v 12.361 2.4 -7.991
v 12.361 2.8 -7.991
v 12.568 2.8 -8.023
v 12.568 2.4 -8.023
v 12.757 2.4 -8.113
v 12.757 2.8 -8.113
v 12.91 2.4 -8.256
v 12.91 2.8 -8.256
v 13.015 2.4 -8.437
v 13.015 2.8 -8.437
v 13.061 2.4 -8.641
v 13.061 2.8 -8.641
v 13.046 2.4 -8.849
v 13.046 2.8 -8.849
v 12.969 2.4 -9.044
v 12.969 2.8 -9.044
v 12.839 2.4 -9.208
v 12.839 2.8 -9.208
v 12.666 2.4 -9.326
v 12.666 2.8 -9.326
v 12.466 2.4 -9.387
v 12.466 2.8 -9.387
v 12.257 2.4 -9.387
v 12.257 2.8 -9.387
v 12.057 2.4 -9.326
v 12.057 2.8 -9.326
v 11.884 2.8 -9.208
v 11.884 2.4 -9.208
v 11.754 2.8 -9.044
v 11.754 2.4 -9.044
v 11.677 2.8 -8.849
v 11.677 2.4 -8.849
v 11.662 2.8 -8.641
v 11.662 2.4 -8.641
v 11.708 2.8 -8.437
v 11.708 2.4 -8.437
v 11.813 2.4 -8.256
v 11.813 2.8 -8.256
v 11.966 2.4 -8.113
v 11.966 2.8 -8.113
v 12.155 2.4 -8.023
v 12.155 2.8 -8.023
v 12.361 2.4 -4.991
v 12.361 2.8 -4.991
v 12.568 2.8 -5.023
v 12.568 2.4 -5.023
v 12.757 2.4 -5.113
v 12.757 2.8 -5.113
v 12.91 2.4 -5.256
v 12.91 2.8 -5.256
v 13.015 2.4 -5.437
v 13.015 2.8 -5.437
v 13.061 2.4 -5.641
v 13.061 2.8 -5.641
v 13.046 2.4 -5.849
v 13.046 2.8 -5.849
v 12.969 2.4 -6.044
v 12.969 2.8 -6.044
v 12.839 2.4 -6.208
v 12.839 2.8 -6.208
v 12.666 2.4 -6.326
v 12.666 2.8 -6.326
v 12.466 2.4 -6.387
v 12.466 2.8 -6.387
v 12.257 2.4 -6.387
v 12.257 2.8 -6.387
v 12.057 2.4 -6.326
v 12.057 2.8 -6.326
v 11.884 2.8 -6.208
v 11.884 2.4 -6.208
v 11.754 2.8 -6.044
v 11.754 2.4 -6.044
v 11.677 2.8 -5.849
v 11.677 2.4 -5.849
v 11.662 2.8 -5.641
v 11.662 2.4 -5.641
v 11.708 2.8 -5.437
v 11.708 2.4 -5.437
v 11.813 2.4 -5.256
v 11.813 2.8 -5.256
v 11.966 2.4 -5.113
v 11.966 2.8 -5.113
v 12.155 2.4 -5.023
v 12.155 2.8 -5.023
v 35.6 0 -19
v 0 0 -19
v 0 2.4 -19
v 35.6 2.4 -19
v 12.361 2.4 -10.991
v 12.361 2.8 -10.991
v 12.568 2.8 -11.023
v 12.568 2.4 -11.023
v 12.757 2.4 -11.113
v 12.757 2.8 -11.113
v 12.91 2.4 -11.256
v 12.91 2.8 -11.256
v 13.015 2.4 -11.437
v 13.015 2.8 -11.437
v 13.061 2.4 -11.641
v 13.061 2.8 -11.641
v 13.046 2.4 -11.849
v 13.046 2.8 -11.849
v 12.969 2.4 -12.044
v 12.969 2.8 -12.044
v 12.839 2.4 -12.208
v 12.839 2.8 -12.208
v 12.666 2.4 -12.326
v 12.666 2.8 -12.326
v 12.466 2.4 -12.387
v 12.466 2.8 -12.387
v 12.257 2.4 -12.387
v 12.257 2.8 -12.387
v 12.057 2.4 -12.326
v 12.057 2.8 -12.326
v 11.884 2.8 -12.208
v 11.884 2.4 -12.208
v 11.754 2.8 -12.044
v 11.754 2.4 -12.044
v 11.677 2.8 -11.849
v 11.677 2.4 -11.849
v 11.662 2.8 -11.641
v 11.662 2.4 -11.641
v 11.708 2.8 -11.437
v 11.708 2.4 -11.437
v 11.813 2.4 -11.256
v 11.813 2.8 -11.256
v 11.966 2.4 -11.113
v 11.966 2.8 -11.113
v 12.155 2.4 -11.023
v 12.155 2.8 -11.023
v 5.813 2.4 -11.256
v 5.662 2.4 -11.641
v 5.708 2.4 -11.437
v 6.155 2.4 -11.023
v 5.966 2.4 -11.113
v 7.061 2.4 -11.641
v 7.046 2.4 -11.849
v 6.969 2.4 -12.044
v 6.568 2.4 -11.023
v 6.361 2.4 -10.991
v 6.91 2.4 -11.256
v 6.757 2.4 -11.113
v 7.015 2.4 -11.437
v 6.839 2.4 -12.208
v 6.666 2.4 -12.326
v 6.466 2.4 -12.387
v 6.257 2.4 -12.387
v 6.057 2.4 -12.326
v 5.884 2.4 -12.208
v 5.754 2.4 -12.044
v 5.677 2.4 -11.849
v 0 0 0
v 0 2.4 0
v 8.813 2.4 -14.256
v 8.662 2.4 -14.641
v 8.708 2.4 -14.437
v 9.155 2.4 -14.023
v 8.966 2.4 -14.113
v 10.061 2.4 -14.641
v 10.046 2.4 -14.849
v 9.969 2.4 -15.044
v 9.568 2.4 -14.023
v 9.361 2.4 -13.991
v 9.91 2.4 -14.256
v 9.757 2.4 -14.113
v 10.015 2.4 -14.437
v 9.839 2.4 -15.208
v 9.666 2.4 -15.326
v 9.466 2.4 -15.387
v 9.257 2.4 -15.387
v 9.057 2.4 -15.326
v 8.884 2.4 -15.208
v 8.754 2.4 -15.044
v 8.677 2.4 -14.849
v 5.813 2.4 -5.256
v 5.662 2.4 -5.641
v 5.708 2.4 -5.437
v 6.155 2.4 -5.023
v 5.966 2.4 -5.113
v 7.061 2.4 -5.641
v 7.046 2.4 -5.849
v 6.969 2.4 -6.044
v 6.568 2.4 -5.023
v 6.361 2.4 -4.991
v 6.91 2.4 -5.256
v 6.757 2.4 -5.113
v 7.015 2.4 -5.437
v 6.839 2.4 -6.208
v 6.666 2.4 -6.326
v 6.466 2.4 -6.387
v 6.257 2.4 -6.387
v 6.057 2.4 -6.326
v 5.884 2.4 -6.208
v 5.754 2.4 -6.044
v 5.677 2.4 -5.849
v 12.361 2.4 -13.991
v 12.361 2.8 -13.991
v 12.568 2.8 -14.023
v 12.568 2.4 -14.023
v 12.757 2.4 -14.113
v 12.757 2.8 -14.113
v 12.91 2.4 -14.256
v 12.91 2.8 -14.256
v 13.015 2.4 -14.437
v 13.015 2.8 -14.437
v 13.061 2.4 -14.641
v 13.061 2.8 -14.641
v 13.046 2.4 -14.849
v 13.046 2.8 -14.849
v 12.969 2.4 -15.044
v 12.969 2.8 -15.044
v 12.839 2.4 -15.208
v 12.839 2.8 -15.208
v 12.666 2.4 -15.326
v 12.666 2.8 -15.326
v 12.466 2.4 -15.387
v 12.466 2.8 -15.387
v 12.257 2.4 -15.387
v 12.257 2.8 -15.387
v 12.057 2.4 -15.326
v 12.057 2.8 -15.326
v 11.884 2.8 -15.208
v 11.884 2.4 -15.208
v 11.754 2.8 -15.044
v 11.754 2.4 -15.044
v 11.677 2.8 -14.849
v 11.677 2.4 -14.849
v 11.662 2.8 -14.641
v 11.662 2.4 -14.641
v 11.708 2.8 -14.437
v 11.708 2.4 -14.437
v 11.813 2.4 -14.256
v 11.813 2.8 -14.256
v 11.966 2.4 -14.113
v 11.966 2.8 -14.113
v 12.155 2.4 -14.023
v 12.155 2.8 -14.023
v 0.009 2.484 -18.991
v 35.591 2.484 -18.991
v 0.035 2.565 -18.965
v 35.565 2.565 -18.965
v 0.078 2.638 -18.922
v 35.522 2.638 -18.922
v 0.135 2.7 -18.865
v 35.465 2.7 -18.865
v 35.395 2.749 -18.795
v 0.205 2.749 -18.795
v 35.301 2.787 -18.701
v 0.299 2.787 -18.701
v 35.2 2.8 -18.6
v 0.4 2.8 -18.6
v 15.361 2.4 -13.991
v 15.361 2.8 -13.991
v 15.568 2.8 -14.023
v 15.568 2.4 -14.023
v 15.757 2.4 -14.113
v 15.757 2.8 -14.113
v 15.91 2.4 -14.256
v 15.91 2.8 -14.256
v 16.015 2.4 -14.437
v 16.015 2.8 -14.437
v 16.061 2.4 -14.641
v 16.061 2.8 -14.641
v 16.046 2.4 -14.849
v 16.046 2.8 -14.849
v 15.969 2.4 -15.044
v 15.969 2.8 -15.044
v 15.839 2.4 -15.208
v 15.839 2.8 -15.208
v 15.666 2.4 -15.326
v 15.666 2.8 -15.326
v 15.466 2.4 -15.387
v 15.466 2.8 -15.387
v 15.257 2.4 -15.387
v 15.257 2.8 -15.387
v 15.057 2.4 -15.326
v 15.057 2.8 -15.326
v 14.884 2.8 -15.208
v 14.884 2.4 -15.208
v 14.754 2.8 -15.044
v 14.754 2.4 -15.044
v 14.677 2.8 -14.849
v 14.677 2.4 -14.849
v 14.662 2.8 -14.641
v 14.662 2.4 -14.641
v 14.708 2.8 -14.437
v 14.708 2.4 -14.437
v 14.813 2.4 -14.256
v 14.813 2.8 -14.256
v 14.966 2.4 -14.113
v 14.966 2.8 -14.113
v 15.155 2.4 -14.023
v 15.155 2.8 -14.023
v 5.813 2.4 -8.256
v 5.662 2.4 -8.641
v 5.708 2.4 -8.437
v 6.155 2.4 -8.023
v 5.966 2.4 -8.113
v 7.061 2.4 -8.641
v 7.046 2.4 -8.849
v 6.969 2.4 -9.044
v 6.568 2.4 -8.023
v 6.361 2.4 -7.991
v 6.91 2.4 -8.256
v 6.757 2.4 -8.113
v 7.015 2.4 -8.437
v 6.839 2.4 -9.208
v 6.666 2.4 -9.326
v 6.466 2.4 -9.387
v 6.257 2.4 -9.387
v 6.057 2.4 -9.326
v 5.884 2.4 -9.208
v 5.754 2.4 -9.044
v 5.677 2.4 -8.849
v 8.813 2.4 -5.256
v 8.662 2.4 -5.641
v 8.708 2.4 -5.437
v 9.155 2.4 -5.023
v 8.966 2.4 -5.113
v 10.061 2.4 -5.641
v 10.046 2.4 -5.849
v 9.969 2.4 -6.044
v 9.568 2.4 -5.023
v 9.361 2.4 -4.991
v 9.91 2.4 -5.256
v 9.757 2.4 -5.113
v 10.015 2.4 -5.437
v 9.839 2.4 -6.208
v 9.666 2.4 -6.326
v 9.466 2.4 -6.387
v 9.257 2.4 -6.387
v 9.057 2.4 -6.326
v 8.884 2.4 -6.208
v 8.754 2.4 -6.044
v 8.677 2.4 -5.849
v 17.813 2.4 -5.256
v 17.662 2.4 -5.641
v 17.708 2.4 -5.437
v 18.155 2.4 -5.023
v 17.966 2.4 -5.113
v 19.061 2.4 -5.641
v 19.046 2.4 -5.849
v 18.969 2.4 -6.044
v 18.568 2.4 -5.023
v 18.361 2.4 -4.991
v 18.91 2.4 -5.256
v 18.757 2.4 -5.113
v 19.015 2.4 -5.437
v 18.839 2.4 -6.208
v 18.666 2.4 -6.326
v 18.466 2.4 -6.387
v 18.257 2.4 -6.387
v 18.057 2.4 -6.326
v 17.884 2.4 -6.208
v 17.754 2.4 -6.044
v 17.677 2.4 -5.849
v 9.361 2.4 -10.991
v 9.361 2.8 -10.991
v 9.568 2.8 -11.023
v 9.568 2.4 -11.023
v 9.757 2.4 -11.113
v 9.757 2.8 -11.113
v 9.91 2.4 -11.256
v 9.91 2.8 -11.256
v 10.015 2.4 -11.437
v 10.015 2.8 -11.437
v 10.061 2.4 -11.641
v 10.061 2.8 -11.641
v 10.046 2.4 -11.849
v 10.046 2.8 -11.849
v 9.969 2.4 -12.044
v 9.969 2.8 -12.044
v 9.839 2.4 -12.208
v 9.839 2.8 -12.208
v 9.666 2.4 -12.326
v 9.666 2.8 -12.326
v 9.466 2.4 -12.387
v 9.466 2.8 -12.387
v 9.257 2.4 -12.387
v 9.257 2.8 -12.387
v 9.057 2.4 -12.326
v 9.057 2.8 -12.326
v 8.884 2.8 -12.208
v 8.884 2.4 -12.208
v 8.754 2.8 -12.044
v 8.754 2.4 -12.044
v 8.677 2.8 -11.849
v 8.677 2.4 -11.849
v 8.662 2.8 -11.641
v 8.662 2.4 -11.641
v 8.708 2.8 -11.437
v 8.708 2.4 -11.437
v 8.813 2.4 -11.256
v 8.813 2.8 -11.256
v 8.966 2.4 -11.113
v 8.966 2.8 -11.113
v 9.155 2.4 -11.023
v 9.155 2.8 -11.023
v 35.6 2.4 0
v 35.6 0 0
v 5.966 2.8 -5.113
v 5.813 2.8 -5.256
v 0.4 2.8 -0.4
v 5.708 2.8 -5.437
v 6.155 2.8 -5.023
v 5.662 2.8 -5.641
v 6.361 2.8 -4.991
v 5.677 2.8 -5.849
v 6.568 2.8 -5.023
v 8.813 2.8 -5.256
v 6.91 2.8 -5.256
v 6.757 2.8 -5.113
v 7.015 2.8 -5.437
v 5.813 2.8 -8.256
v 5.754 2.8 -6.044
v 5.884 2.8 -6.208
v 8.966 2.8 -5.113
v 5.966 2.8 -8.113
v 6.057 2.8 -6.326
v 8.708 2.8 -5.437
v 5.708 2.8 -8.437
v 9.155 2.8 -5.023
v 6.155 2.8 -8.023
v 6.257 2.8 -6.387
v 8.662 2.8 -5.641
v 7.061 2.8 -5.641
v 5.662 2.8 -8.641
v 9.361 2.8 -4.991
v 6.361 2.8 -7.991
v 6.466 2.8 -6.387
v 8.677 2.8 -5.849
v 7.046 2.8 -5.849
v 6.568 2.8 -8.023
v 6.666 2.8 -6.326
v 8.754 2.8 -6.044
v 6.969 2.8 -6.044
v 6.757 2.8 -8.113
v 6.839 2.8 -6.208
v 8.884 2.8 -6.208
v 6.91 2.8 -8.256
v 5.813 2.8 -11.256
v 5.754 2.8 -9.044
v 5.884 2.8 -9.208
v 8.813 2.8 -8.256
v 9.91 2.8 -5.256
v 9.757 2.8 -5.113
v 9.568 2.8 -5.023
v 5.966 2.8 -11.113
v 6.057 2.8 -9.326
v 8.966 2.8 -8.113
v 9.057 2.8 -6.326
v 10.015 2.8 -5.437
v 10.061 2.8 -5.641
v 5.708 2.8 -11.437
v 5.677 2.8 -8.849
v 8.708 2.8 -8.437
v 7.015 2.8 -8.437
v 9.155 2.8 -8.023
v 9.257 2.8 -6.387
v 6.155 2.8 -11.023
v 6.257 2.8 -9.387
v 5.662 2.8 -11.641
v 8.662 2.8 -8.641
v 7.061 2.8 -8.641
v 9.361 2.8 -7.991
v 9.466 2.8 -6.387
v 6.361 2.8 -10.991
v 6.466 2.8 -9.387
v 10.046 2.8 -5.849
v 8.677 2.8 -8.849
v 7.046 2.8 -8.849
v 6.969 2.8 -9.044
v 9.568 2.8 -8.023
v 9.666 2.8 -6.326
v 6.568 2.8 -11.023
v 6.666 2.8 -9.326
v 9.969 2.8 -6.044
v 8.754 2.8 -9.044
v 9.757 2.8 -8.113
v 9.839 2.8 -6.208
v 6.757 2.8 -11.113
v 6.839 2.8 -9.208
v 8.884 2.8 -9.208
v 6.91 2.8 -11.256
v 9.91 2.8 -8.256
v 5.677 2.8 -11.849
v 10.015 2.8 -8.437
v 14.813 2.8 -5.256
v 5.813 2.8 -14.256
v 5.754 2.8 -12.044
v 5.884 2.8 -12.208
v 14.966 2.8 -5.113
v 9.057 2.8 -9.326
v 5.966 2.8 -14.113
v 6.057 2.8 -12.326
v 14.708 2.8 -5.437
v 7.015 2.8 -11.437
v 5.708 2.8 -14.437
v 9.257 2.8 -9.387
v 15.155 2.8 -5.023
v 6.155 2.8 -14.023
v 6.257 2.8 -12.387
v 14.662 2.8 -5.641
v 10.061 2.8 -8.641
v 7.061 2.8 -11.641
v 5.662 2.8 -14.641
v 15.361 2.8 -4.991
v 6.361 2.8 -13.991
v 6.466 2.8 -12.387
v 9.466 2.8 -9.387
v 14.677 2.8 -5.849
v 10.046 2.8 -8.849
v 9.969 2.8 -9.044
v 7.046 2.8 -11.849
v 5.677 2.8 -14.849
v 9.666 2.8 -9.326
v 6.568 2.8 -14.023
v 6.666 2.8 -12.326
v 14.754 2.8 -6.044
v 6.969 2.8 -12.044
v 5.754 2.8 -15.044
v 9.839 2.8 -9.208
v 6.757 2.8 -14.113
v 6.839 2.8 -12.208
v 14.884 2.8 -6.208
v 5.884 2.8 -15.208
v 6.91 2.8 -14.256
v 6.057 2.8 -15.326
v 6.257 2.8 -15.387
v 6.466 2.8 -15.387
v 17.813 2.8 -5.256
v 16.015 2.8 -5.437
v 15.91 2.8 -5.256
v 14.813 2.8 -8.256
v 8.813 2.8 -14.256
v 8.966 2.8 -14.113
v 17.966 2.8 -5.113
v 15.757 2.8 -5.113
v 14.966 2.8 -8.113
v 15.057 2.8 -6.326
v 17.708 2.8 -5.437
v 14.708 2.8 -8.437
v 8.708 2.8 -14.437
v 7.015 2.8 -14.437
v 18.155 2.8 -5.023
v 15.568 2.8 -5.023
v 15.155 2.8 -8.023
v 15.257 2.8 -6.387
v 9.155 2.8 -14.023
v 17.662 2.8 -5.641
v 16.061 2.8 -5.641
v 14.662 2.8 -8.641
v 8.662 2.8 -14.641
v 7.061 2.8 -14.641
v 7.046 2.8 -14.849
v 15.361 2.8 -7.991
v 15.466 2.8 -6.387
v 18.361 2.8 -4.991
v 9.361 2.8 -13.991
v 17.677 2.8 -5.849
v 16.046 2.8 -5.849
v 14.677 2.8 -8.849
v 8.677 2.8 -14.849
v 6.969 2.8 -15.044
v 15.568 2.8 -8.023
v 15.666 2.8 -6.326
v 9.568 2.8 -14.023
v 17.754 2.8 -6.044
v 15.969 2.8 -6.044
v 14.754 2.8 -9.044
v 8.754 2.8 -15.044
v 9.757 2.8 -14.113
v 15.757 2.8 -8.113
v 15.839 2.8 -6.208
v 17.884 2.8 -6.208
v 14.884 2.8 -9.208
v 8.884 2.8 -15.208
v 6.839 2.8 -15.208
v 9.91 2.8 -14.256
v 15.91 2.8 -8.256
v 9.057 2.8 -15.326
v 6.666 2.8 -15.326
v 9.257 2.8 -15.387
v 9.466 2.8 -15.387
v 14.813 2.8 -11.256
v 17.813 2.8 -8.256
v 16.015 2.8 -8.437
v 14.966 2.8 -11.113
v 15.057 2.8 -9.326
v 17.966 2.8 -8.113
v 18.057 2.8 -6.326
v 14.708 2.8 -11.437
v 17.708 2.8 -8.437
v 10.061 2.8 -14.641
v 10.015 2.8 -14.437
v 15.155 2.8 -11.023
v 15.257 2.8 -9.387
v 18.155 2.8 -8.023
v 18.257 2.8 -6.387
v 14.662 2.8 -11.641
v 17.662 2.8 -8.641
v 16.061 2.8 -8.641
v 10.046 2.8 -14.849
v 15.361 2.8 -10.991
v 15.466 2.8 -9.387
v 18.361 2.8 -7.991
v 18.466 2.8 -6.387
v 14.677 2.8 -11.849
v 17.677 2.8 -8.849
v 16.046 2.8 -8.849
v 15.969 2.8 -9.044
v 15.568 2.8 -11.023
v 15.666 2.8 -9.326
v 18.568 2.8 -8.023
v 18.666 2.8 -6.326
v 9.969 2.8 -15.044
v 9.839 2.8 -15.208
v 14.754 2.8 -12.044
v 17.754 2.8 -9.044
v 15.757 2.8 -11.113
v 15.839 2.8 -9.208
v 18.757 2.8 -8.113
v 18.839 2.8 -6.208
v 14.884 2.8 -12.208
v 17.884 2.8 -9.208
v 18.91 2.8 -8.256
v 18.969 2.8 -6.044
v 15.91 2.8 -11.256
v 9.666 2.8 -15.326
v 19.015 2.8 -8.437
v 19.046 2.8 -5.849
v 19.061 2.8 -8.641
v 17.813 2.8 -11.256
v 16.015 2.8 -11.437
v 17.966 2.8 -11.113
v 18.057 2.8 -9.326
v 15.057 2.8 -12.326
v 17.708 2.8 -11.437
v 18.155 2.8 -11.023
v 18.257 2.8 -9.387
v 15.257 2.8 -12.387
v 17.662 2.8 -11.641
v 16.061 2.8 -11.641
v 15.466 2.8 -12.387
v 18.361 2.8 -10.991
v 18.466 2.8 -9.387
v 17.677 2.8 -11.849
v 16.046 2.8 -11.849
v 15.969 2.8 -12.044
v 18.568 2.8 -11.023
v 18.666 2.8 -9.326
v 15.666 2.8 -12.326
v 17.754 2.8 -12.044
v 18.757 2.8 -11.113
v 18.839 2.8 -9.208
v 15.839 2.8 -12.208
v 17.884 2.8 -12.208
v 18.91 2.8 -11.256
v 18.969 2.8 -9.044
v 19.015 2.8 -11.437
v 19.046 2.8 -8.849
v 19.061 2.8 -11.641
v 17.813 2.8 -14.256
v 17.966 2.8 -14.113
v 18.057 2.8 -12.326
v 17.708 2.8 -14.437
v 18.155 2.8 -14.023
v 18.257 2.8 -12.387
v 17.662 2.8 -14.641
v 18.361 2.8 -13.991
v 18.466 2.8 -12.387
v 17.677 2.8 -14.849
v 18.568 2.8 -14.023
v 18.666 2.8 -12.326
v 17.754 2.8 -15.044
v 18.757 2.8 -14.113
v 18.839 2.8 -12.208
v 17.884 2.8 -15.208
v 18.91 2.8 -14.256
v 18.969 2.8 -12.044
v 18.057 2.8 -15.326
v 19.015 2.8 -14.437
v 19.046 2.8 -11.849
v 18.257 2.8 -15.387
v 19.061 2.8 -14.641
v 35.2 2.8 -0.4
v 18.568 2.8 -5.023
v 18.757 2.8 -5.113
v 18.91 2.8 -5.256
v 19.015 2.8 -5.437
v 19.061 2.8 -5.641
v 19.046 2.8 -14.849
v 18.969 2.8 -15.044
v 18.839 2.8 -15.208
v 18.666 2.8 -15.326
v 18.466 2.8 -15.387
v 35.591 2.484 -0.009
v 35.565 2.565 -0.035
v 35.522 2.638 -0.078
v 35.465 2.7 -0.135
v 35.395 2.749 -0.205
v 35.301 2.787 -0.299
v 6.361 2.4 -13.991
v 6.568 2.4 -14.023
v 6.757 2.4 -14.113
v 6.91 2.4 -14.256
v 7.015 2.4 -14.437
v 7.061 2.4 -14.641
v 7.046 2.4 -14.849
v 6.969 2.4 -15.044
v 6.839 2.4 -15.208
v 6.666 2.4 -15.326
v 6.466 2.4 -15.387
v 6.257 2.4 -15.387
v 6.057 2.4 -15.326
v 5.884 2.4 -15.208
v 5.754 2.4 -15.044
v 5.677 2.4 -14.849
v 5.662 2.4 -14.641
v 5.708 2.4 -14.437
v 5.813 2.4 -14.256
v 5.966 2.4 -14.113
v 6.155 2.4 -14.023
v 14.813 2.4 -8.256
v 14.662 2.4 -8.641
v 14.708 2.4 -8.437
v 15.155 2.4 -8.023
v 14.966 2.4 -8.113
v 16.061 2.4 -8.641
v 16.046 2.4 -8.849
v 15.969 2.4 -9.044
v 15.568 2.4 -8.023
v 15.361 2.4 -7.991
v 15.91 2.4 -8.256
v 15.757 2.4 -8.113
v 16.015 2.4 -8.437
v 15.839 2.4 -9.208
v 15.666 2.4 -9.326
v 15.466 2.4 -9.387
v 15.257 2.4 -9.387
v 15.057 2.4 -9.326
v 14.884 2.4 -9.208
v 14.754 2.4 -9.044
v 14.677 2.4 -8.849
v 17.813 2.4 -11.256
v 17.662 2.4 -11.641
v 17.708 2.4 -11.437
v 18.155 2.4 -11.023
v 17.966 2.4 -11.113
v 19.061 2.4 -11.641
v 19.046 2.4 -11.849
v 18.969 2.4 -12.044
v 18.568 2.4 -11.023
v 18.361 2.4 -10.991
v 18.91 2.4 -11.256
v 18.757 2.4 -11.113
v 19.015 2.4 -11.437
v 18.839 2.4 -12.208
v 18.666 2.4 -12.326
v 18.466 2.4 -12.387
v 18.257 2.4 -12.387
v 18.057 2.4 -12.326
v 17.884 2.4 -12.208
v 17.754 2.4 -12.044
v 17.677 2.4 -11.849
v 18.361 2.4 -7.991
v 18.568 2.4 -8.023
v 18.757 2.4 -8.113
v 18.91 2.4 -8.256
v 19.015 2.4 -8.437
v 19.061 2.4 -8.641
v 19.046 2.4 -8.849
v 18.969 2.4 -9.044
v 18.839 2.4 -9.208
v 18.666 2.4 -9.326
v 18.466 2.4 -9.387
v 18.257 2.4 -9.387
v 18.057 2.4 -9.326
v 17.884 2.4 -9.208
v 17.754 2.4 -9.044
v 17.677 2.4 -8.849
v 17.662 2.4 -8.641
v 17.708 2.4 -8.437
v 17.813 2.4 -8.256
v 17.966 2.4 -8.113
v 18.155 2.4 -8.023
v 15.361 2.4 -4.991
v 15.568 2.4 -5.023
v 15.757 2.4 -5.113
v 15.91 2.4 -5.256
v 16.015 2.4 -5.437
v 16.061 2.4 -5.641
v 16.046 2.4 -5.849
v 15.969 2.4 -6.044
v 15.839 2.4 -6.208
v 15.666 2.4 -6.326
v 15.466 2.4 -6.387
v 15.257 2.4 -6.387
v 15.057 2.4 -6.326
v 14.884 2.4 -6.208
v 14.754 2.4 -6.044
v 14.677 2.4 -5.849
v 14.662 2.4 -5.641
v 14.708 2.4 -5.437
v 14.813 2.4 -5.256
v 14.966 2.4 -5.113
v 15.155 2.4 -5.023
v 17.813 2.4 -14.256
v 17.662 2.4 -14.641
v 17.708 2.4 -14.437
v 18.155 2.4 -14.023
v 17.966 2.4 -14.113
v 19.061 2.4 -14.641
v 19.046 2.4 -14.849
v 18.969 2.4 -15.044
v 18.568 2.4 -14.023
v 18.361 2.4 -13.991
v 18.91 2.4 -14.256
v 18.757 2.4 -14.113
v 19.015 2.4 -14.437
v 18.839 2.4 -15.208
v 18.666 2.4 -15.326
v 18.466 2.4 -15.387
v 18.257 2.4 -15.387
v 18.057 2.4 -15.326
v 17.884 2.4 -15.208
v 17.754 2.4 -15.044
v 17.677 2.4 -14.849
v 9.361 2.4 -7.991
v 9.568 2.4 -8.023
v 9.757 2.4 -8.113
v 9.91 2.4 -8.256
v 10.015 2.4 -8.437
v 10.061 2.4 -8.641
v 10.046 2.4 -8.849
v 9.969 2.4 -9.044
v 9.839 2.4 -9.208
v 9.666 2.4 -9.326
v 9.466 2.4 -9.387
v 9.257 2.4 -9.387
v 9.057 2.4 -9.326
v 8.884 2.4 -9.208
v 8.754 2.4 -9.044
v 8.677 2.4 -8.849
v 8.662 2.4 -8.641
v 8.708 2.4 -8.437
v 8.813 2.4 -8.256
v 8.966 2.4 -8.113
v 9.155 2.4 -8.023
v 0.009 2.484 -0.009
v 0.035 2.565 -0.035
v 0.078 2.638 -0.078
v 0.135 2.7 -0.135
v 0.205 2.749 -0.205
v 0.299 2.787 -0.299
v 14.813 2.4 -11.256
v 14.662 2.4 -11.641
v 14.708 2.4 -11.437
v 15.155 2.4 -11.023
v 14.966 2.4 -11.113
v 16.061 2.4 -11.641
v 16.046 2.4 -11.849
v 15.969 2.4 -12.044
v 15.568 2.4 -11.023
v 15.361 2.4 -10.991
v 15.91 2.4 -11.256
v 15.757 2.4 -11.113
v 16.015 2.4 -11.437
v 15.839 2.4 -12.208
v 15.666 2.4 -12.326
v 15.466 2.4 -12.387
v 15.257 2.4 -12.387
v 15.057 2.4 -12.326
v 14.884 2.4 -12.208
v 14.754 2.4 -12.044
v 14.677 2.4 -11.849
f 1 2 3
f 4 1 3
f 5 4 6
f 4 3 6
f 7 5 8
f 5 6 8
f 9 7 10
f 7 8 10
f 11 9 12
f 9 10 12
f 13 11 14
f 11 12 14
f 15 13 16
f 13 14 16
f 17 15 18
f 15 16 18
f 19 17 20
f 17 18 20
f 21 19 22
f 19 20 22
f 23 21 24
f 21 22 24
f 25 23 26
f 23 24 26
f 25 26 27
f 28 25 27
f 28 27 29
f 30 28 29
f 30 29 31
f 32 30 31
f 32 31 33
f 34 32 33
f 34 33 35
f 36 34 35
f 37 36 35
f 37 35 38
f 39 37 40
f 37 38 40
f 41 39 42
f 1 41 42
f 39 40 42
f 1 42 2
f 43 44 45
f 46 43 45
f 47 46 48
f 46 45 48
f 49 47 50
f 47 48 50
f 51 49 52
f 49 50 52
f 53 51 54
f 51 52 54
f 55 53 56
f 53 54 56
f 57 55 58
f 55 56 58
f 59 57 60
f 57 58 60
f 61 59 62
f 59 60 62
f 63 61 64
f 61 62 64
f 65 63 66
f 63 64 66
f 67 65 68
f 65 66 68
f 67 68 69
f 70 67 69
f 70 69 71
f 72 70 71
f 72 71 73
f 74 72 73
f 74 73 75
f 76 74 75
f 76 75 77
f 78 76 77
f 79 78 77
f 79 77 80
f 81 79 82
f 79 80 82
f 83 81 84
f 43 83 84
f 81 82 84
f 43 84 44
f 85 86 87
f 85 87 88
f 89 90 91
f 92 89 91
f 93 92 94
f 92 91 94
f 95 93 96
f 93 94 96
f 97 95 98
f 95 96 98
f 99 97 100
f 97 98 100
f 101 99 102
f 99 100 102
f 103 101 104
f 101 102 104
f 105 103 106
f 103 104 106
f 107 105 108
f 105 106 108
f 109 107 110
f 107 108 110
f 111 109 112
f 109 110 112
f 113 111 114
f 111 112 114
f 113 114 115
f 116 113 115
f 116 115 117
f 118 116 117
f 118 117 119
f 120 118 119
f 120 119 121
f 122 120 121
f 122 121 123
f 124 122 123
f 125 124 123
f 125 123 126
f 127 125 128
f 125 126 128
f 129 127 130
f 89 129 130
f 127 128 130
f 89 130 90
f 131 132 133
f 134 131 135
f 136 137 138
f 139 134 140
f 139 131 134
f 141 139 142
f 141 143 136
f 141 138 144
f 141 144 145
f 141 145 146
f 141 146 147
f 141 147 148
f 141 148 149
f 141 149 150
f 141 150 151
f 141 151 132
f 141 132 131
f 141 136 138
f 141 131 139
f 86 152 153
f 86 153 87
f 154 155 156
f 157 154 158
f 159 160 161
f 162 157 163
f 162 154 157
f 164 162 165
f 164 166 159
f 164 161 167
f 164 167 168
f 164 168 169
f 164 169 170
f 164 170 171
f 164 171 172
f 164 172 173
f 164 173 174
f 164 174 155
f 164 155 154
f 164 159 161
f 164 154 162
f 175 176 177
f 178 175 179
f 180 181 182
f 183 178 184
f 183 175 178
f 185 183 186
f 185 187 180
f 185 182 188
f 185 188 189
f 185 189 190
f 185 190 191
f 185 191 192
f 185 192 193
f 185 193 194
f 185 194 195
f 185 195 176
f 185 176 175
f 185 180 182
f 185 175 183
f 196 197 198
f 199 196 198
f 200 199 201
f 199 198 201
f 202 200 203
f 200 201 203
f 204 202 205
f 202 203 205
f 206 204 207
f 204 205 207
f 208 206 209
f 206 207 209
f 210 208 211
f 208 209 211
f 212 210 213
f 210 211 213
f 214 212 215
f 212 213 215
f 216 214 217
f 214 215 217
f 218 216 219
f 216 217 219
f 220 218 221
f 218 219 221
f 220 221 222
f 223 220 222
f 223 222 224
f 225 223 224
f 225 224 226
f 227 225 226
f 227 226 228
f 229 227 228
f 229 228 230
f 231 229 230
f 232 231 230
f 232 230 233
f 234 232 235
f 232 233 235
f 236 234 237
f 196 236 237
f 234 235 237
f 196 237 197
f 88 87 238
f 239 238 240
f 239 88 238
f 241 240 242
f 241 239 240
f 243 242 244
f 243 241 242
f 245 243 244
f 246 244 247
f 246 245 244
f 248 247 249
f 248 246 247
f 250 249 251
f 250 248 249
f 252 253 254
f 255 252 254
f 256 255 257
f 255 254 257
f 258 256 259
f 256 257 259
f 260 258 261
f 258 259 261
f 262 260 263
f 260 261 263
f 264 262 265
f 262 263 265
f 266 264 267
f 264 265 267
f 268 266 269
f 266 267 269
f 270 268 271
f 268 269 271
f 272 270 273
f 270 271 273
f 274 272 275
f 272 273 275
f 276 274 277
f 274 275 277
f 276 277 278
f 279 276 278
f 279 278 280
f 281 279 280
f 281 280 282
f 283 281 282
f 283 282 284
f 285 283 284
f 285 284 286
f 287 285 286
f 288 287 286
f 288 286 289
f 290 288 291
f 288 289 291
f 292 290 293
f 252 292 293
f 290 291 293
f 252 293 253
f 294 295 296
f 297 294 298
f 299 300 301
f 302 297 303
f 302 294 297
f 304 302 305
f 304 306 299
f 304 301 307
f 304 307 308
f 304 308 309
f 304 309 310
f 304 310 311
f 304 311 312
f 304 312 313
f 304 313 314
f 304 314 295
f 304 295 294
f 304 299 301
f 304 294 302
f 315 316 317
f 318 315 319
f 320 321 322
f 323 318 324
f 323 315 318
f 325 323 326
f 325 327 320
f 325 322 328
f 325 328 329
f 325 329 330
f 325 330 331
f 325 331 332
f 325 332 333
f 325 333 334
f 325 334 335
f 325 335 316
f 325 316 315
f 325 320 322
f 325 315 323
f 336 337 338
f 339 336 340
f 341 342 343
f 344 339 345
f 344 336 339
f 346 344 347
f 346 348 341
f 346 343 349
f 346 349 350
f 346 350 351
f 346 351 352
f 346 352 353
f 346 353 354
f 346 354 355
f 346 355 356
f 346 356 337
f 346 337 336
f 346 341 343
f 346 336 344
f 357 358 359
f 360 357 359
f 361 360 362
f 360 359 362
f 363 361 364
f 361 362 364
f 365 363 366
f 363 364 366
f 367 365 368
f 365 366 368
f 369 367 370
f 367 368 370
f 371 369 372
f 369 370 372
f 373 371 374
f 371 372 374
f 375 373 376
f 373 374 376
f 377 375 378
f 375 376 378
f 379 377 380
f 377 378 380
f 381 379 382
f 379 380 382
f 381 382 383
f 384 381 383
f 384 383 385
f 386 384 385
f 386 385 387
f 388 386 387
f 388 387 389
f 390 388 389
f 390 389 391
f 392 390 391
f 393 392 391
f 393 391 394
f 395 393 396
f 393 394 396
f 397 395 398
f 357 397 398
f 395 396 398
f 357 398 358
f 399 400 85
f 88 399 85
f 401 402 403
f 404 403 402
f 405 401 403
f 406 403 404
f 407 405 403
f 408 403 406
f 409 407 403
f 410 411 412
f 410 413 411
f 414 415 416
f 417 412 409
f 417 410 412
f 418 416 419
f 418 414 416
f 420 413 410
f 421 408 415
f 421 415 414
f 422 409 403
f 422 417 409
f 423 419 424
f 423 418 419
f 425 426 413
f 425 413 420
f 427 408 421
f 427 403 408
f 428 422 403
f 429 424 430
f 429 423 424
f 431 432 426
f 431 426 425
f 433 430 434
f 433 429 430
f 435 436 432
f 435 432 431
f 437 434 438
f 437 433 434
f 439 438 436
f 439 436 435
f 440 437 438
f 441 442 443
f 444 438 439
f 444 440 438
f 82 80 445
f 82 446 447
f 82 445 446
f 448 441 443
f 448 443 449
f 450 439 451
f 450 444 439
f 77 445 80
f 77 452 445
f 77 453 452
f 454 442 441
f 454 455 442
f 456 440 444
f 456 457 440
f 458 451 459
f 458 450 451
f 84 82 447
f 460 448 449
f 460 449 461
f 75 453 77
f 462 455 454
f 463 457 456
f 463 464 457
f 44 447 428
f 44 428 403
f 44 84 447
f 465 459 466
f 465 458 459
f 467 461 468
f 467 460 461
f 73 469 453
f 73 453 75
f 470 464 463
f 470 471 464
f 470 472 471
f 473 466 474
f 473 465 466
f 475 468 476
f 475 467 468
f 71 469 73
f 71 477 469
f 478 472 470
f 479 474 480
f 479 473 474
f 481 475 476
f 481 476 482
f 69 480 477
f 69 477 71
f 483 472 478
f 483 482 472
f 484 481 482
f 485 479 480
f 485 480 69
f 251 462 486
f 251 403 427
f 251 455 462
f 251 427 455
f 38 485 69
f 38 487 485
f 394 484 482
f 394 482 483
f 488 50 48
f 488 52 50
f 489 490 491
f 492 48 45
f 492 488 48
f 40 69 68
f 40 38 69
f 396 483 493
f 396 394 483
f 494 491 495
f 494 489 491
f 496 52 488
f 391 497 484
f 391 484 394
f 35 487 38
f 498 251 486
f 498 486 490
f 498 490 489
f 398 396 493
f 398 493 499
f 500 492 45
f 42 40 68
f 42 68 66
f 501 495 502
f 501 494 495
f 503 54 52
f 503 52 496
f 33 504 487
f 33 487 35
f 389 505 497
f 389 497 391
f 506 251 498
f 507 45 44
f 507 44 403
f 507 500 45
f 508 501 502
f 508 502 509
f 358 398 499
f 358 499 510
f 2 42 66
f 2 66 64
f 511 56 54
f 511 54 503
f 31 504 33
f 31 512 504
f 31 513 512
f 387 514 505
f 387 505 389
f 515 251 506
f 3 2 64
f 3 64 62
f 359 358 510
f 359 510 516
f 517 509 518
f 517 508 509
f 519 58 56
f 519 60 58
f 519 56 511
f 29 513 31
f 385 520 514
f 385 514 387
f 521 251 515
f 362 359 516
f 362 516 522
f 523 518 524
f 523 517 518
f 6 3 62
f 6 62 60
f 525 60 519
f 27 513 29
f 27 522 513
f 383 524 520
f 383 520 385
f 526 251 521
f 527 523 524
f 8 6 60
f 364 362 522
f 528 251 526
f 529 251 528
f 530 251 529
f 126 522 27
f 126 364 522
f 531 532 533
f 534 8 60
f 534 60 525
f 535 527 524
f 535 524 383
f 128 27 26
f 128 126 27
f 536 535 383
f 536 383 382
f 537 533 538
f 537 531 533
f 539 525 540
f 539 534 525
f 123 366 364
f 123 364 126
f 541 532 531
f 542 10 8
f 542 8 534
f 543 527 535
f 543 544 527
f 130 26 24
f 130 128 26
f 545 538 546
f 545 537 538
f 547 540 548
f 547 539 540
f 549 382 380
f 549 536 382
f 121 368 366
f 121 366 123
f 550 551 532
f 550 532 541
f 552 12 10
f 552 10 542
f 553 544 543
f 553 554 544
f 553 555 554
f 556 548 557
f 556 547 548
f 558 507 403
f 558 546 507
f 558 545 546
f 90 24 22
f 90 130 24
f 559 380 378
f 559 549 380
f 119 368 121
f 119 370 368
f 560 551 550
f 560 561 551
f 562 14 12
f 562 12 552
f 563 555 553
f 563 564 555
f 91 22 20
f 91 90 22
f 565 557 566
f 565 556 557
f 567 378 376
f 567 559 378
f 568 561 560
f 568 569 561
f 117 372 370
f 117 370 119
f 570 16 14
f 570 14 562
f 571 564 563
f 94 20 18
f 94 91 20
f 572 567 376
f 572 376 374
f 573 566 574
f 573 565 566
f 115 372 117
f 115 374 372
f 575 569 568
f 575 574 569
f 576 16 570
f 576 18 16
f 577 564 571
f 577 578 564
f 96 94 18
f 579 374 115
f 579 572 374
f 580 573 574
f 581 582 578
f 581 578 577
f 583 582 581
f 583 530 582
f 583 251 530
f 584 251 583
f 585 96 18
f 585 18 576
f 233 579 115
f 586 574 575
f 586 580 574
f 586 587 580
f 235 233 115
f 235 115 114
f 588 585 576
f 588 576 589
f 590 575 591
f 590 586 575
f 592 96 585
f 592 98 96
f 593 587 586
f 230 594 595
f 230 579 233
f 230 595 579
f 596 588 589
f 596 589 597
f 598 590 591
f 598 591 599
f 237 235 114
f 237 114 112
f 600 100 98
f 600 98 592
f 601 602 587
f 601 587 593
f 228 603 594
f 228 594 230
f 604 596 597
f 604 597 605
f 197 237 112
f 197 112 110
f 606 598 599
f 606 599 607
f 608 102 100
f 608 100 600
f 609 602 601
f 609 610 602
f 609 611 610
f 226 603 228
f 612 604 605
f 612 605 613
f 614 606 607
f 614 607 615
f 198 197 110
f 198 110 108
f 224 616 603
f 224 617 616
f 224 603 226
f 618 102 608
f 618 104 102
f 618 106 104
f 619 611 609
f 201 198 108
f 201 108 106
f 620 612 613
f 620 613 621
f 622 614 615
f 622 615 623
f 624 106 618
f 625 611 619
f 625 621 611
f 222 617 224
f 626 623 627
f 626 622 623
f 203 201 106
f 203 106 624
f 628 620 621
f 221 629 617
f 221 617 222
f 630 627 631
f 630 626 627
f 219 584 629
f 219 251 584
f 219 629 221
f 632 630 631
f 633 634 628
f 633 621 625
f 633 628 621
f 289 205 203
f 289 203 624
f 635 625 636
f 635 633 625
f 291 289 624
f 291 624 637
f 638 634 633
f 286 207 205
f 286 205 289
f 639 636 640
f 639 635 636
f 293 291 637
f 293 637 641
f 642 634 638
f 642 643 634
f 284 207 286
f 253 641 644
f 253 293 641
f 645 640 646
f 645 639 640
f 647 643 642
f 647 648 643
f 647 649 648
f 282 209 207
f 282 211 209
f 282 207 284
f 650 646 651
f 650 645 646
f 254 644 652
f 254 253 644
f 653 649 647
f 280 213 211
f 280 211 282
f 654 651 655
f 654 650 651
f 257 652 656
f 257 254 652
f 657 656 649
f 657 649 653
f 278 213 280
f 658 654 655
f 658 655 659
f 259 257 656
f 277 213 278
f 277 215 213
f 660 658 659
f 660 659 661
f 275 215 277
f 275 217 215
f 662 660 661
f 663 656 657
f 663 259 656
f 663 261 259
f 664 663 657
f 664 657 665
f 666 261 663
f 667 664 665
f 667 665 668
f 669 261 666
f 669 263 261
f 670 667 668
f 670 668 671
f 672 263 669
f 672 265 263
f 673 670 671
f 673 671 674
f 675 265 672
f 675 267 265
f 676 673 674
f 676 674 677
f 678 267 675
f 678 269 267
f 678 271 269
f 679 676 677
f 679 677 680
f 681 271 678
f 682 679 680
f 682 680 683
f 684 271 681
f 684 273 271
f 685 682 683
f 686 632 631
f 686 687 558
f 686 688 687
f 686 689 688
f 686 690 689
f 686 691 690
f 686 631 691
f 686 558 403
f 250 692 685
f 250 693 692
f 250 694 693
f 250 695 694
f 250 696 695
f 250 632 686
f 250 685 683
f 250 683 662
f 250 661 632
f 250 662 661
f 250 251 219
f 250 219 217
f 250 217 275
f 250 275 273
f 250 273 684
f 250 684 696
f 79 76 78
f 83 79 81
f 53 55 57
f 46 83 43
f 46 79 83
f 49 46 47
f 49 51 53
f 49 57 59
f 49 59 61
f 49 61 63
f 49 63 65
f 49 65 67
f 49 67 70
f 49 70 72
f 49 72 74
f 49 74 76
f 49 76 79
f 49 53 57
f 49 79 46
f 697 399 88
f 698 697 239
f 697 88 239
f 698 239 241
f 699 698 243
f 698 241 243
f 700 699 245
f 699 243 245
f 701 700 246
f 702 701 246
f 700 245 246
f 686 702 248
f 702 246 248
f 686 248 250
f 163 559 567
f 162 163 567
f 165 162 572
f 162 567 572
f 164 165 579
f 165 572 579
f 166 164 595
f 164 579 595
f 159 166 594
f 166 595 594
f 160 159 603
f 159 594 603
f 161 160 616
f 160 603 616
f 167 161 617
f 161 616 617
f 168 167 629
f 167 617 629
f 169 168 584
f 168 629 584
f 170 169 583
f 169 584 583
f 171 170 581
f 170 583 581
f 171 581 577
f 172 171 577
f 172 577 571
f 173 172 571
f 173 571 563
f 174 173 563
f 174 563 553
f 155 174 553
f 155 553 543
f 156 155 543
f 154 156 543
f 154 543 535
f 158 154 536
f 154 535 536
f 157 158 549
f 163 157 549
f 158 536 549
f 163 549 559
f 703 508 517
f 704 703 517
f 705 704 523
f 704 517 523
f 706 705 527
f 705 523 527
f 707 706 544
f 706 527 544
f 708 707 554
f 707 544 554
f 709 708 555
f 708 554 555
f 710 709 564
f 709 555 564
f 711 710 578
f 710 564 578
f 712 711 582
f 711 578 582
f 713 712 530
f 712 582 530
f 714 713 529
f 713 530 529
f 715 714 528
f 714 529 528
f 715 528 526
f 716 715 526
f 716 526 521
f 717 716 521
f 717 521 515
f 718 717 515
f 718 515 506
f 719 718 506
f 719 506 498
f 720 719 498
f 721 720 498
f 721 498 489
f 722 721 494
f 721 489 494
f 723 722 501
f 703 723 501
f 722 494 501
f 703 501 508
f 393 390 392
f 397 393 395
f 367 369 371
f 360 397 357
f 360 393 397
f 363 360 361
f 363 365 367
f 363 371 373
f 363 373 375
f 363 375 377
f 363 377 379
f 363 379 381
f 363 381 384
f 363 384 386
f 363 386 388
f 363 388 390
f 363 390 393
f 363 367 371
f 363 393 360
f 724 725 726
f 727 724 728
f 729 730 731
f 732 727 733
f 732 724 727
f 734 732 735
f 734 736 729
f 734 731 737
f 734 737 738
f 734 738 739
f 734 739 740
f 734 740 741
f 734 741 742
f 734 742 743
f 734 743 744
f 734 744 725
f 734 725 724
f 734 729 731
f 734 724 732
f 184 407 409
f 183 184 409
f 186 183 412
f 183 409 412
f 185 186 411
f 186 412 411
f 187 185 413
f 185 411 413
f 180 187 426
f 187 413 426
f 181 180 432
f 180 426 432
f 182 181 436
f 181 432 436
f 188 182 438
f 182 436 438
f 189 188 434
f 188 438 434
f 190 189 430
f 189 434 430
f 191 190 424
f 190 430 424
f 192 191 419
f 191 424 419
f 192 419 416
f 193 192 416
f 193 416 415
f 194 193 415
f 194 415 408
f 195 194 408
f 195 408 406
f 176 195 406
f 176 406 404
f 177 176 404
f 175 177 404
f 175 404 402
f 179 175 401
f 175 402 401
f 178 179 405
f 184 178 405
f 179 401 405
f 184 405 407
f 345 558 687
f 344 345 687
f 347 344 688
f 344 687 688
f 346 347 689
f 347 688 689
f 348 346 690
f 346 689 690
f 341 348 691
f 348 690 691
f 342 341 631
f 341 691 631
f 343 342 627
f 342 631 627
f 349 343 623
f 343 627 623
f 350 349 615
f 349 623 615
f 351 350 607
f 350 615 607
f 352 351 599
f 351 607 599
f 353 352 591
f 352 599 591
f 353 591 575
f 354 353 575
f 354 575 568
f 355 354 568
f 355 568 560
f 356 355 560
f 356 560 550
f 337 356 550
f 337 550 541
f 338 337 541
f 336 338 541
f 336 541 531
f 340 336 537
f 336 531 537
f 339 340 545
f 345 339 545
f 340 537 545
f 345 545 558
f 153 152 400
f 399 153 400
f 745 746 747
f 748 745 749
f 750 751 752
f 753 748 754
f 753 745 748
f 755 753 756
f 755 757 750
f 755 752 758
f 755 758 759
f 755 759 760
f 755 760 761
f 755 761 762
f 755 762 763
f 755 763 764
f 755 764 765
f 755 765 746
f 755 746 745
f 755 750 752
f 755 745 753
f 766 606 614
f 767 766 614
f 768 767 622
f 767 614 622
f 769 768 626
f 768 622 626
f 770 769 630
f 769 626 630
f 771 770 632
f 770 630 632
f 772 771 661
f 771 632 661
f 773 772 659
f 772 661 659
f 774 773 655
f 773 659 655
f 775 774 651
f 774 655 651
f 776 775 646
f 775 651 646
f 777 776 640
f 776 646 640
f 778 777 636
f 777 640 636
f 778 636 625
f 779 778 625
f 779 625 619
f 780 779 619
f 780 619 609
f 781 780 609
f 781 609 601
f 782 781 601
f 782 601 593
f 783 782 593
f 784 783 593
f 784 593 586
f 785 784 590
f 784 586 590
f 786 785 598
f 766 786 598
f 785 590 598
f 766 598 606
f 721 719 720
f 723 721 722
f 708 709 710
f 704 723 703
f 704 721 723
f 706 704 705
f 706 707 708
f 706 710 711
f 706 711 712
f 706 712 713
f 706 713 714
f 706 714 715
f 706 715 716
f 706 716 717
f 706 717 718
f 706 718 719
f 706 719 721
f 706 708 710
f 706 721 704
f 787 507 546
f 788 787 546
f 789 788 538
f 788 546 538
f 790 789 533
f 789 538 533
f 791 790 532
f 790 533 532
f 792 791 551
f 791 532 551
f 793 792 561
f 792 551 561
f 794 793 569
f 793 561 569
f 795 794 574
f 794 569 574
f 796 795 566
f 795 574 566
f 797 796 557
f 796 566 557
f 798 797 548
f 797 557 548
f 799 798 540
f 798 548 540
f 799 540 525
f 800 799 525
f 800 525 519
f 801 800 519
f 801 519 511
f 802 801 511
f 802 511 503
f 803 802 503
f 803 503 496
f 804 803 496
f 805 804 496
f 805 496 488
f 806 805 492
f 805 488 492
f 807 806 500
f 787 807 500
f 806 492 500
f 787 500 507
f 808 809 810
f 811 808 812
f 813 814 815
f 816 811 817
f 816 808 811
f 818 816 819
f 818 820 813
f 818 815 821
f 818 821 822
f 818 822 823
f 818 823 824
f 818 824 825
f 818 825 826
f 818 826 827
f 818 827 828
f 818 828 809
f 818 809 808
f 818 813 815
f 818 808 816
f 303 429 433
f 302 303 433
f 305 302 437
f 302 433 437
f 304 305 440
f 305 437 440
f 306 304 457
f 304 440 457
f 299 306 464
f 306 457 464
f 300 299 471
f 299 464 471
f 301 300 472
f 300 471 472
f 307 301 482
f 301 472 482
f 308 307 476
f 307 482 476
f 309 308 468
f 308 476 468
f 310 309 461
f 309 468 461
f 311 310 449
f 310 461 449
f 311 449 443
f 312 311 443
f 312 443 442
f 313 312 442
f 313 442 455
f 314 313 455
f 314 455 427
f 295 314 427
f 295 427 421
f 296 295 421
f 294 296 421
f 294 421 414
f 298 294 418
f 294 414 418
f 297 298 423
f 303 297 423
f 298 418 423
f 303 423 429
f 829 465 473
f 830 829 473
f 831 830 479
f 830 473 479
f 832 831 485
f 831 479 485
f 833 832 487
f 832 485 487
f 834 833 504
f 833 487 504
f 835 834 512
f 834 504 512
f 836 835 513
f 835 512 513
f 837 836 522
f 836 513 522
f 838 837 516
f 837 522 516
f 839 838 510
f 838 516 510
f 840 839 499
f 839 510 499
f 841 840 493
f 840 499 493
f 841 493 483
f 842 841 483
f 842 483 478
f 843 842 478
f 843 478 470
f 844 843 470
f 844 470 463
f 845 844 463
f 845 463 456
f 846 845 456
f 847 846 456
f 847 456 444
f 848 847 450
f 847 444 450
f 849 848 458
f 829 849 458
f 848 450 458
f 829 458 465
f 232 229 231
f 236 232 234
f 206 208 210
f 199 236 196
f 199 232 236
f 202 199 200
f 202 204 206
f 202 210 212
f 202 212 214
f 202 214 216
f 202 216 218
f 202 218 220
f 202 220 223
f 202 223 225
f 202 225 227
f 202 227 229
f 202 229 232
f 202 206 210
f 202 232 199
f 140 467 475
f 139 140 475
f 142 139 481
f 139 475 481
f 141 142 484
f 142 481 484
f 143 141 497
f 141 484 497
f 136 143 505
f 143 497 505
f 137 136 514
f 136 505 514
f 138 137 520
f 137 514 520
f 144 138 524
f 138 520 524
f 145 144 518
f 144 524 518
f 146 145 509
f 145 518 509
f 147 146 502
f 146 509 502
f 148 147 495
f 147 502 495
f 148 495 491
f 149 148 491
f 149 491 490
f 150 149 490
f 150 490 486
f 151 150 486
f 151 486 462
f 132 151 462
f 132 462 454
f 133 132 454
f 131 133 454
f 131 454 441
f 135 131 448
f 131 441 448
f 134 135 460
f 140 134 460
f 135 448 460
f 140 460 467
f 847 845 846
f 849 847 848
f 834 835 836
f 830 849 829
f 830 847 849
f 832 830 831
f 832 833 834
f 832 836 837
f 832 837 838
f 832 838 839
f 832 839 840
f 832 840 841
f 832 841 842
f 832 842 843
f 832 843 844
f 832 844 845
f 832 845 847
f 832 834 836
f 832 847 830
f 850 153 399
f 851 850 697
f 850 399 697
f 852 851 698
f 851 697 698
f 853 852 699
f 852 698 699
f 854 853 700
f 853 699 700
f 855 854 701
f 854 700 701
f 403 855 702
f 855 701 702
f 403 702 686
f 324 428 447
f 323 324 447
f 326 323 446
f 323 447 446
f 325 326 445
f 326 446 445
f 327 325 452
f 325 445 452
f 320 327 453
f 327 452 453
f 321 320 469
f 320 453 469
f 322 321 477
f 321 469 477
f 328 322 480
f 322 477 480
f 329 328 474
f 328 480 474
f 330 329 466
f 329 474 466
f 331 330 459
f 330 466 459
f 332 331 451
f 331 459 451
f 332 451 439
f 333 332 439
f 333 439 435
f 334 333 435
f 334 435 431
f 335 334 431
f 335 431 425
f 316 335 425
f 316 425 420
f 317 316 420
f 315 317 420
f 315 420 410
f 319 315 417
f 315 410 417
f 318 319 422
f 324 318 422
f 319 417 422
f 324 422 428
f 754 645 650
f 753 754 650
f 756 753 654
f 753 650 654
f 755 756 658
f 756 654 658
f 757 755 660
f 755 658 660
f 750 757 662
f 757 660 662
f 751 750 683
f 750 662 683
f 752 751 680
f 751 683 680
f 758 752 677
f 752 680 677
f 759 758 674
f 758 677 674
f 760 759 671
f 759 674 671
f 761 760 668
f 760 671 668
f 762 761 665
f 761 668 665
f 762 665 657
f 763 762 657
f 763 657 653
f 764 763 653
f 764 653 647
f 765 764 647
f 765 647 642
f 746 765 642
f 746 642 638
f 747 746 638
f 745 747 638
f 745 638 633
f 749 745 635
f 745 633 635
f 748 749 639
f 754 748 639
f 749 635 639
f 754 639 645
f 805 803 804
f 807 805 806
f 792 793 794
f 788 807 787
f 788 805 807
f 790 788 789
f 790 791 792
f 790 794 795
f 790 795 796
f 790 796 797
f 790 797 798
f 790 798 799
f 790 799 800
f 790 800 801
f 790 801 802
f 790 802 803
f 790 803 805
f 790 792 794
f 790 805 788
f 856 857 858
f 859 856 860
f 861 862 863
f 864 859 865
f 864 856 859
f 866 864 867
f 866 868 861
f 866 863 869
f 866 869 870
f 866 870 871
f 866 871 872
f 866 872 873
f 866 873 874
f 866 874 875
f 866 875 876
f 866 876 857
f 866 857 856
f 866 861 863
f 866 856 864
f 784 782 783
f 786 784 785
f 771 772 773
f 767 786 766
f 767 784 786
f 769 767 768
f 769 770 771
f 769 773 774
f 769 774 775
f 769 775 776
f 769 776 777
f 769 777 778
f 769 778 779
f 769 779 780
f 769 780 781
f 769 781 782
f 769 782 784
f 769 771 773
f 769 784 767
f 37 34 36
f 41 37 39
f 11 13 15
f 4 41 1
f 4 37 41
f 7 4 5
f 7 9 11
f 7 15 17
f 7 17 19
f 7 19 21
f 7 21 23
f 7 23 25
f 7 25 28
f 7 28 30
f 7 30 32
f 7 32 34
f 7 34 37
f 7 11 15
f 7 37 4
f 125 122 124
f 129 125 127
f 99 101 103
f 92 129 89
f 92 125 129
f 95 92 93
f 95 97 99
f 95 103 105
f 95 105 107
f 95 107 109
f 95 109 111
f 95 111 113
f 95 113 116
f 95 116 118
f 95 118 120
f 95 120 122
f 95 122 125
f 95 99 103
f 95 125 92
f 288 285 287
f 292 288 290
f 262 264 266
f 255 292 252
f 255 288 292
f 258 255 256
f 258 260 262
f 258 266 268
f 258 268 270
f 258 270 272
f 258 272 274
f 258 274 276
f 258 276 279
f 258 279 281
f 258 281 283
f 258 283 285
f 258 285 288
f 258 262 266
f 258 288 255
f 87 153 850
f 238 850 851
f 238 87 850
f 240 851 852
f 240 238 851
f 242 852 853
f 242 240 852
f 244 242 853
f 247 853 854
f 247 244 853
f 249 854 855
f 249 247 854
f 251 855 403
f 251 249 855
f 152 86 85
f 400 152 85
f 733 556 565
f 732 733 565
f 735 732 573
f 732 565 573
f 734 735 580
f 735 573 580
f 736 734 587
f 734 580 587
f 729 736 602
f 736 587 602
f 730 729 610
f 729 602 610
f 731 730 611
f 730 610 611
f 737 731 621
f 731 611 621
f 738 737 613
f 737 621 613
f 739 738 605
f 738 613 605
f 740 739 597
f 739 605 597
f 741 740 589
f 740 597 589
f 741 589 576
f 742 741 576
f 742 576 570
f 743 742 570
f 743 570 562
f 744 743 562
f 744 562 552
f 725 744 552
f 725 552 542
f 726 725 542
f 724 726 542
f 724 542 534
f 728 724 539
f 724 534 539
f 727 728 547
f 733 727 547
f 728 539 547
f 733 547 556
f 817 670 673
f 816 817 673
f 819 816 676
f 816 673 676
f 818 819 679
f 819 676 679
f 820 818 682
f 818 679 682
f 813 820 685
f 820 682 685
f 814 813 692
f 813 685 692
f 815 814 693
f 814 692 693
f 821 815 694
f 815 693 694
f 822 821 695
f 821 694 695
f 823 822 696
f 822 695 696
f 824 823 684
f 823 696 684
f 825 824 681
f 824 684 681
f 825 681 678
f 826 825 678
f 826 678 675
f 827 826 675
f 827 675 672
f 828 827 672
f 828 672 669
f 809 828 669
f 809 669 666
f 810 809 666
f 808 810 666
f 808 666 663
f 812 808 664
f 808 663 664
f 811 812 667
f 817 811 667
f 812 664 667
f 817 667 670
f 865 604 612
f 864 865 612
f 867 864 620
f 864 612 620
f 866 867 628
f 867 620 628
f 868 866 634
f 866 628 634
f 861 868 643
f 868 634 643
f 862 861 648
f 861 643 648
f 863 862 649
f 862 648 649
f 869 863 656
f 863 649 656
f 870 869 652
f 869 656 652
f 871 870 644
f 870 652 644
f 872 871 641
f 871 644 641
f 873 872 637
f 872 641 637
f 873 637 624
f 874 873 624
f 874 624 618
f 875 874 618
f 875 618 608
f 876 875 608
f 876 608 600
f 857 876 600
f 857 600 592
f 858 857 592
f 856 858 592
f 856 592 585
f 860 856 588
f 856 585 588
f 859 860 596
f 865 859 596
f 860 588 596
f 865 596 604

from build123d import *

# Parameters (mm, degrees)
ESQUISSE1_W                     = 35.6
ESQUISSE1_H                     = 19
BOSS_EXTRU_1_DEPTH              = 2.8
CONG_1_R                        = 0.4
ESQUISSE2_R                     = 0.701862225
ENL_V_MAT_EXTRU_1_DEPTH         = 0.4
R_P_TITION_LIN_AIRE1_COUNT      = 5
R_P_TITION_LIN_AIRE1_PITCH      = 3
R_P_TITION_LIN_AIRE1_COUNT_DIR2 = 4
R_P_TITION_LIN_AIRE1_PITCH_DIR2 = 3


with BuildPart() as part:
    # Esquisse1 → Boss.-Extru.1 (new body)
    with BuildSketch(Plane(origin=(0, 0, 0), x_dir=(1, 0, 0), z_dir=(0, 1, 0))):
        with Locations((17.8, 9.5)):
            Rectangle(ESQUISSE1_W, ESQUISSE1_H)
    extrude(amount=BOSS_EXTRU_1_DEPTH)

    # Congé1
    cong_1_edges = [part.edges().sort_by_distance(p)[0] for p in [
        (35.6, 2.8, -9.5),
        (17.8, 2.8, -19),
        (0, 2.8, -9.5),
        (17.8, 2.8, 0),
    ]]
    fillet(cong_1_edges, radius=CONG_1_R)

    # Esquisse2 → Enlèv. mat.-Extru.1 (cut)
    with BuildSketch(Plane(origin=(0, 2.8, 0), x_dir=(1, 0, 0), z_dir=(0, 1, 0))):
        with Locations(Location((6.361489544, 14.69324156, 0), (0, 0, 270))):
            Circle(ESQUISSE2_R)
    enl_v_mat_extru_1 = extrude(amount=-ENL_V_MAT_EXTRU_1_DEPTH, mode=Mode.SUBTRACT)

    # Répétition linéaire1: Enl_v. mat.-Extru.1 5 × 4
    with Locations(*[(i * R_P_TITION_LIN_AIRE1_PITCH, 0, j * R_P_TITION_LIN_AIRE1_PITCH_DIR2) for i in range(R_P_TITION_LIN_AIRE1_COUNT) for j in range(R_P_TITION_LIN_AIRE1_COUNT_DIR2) if (i, j) != (0, 0)]):
        add(enl_v_mat_extru_1, mode=Mode.SUBTRACT)


solid = part.part
